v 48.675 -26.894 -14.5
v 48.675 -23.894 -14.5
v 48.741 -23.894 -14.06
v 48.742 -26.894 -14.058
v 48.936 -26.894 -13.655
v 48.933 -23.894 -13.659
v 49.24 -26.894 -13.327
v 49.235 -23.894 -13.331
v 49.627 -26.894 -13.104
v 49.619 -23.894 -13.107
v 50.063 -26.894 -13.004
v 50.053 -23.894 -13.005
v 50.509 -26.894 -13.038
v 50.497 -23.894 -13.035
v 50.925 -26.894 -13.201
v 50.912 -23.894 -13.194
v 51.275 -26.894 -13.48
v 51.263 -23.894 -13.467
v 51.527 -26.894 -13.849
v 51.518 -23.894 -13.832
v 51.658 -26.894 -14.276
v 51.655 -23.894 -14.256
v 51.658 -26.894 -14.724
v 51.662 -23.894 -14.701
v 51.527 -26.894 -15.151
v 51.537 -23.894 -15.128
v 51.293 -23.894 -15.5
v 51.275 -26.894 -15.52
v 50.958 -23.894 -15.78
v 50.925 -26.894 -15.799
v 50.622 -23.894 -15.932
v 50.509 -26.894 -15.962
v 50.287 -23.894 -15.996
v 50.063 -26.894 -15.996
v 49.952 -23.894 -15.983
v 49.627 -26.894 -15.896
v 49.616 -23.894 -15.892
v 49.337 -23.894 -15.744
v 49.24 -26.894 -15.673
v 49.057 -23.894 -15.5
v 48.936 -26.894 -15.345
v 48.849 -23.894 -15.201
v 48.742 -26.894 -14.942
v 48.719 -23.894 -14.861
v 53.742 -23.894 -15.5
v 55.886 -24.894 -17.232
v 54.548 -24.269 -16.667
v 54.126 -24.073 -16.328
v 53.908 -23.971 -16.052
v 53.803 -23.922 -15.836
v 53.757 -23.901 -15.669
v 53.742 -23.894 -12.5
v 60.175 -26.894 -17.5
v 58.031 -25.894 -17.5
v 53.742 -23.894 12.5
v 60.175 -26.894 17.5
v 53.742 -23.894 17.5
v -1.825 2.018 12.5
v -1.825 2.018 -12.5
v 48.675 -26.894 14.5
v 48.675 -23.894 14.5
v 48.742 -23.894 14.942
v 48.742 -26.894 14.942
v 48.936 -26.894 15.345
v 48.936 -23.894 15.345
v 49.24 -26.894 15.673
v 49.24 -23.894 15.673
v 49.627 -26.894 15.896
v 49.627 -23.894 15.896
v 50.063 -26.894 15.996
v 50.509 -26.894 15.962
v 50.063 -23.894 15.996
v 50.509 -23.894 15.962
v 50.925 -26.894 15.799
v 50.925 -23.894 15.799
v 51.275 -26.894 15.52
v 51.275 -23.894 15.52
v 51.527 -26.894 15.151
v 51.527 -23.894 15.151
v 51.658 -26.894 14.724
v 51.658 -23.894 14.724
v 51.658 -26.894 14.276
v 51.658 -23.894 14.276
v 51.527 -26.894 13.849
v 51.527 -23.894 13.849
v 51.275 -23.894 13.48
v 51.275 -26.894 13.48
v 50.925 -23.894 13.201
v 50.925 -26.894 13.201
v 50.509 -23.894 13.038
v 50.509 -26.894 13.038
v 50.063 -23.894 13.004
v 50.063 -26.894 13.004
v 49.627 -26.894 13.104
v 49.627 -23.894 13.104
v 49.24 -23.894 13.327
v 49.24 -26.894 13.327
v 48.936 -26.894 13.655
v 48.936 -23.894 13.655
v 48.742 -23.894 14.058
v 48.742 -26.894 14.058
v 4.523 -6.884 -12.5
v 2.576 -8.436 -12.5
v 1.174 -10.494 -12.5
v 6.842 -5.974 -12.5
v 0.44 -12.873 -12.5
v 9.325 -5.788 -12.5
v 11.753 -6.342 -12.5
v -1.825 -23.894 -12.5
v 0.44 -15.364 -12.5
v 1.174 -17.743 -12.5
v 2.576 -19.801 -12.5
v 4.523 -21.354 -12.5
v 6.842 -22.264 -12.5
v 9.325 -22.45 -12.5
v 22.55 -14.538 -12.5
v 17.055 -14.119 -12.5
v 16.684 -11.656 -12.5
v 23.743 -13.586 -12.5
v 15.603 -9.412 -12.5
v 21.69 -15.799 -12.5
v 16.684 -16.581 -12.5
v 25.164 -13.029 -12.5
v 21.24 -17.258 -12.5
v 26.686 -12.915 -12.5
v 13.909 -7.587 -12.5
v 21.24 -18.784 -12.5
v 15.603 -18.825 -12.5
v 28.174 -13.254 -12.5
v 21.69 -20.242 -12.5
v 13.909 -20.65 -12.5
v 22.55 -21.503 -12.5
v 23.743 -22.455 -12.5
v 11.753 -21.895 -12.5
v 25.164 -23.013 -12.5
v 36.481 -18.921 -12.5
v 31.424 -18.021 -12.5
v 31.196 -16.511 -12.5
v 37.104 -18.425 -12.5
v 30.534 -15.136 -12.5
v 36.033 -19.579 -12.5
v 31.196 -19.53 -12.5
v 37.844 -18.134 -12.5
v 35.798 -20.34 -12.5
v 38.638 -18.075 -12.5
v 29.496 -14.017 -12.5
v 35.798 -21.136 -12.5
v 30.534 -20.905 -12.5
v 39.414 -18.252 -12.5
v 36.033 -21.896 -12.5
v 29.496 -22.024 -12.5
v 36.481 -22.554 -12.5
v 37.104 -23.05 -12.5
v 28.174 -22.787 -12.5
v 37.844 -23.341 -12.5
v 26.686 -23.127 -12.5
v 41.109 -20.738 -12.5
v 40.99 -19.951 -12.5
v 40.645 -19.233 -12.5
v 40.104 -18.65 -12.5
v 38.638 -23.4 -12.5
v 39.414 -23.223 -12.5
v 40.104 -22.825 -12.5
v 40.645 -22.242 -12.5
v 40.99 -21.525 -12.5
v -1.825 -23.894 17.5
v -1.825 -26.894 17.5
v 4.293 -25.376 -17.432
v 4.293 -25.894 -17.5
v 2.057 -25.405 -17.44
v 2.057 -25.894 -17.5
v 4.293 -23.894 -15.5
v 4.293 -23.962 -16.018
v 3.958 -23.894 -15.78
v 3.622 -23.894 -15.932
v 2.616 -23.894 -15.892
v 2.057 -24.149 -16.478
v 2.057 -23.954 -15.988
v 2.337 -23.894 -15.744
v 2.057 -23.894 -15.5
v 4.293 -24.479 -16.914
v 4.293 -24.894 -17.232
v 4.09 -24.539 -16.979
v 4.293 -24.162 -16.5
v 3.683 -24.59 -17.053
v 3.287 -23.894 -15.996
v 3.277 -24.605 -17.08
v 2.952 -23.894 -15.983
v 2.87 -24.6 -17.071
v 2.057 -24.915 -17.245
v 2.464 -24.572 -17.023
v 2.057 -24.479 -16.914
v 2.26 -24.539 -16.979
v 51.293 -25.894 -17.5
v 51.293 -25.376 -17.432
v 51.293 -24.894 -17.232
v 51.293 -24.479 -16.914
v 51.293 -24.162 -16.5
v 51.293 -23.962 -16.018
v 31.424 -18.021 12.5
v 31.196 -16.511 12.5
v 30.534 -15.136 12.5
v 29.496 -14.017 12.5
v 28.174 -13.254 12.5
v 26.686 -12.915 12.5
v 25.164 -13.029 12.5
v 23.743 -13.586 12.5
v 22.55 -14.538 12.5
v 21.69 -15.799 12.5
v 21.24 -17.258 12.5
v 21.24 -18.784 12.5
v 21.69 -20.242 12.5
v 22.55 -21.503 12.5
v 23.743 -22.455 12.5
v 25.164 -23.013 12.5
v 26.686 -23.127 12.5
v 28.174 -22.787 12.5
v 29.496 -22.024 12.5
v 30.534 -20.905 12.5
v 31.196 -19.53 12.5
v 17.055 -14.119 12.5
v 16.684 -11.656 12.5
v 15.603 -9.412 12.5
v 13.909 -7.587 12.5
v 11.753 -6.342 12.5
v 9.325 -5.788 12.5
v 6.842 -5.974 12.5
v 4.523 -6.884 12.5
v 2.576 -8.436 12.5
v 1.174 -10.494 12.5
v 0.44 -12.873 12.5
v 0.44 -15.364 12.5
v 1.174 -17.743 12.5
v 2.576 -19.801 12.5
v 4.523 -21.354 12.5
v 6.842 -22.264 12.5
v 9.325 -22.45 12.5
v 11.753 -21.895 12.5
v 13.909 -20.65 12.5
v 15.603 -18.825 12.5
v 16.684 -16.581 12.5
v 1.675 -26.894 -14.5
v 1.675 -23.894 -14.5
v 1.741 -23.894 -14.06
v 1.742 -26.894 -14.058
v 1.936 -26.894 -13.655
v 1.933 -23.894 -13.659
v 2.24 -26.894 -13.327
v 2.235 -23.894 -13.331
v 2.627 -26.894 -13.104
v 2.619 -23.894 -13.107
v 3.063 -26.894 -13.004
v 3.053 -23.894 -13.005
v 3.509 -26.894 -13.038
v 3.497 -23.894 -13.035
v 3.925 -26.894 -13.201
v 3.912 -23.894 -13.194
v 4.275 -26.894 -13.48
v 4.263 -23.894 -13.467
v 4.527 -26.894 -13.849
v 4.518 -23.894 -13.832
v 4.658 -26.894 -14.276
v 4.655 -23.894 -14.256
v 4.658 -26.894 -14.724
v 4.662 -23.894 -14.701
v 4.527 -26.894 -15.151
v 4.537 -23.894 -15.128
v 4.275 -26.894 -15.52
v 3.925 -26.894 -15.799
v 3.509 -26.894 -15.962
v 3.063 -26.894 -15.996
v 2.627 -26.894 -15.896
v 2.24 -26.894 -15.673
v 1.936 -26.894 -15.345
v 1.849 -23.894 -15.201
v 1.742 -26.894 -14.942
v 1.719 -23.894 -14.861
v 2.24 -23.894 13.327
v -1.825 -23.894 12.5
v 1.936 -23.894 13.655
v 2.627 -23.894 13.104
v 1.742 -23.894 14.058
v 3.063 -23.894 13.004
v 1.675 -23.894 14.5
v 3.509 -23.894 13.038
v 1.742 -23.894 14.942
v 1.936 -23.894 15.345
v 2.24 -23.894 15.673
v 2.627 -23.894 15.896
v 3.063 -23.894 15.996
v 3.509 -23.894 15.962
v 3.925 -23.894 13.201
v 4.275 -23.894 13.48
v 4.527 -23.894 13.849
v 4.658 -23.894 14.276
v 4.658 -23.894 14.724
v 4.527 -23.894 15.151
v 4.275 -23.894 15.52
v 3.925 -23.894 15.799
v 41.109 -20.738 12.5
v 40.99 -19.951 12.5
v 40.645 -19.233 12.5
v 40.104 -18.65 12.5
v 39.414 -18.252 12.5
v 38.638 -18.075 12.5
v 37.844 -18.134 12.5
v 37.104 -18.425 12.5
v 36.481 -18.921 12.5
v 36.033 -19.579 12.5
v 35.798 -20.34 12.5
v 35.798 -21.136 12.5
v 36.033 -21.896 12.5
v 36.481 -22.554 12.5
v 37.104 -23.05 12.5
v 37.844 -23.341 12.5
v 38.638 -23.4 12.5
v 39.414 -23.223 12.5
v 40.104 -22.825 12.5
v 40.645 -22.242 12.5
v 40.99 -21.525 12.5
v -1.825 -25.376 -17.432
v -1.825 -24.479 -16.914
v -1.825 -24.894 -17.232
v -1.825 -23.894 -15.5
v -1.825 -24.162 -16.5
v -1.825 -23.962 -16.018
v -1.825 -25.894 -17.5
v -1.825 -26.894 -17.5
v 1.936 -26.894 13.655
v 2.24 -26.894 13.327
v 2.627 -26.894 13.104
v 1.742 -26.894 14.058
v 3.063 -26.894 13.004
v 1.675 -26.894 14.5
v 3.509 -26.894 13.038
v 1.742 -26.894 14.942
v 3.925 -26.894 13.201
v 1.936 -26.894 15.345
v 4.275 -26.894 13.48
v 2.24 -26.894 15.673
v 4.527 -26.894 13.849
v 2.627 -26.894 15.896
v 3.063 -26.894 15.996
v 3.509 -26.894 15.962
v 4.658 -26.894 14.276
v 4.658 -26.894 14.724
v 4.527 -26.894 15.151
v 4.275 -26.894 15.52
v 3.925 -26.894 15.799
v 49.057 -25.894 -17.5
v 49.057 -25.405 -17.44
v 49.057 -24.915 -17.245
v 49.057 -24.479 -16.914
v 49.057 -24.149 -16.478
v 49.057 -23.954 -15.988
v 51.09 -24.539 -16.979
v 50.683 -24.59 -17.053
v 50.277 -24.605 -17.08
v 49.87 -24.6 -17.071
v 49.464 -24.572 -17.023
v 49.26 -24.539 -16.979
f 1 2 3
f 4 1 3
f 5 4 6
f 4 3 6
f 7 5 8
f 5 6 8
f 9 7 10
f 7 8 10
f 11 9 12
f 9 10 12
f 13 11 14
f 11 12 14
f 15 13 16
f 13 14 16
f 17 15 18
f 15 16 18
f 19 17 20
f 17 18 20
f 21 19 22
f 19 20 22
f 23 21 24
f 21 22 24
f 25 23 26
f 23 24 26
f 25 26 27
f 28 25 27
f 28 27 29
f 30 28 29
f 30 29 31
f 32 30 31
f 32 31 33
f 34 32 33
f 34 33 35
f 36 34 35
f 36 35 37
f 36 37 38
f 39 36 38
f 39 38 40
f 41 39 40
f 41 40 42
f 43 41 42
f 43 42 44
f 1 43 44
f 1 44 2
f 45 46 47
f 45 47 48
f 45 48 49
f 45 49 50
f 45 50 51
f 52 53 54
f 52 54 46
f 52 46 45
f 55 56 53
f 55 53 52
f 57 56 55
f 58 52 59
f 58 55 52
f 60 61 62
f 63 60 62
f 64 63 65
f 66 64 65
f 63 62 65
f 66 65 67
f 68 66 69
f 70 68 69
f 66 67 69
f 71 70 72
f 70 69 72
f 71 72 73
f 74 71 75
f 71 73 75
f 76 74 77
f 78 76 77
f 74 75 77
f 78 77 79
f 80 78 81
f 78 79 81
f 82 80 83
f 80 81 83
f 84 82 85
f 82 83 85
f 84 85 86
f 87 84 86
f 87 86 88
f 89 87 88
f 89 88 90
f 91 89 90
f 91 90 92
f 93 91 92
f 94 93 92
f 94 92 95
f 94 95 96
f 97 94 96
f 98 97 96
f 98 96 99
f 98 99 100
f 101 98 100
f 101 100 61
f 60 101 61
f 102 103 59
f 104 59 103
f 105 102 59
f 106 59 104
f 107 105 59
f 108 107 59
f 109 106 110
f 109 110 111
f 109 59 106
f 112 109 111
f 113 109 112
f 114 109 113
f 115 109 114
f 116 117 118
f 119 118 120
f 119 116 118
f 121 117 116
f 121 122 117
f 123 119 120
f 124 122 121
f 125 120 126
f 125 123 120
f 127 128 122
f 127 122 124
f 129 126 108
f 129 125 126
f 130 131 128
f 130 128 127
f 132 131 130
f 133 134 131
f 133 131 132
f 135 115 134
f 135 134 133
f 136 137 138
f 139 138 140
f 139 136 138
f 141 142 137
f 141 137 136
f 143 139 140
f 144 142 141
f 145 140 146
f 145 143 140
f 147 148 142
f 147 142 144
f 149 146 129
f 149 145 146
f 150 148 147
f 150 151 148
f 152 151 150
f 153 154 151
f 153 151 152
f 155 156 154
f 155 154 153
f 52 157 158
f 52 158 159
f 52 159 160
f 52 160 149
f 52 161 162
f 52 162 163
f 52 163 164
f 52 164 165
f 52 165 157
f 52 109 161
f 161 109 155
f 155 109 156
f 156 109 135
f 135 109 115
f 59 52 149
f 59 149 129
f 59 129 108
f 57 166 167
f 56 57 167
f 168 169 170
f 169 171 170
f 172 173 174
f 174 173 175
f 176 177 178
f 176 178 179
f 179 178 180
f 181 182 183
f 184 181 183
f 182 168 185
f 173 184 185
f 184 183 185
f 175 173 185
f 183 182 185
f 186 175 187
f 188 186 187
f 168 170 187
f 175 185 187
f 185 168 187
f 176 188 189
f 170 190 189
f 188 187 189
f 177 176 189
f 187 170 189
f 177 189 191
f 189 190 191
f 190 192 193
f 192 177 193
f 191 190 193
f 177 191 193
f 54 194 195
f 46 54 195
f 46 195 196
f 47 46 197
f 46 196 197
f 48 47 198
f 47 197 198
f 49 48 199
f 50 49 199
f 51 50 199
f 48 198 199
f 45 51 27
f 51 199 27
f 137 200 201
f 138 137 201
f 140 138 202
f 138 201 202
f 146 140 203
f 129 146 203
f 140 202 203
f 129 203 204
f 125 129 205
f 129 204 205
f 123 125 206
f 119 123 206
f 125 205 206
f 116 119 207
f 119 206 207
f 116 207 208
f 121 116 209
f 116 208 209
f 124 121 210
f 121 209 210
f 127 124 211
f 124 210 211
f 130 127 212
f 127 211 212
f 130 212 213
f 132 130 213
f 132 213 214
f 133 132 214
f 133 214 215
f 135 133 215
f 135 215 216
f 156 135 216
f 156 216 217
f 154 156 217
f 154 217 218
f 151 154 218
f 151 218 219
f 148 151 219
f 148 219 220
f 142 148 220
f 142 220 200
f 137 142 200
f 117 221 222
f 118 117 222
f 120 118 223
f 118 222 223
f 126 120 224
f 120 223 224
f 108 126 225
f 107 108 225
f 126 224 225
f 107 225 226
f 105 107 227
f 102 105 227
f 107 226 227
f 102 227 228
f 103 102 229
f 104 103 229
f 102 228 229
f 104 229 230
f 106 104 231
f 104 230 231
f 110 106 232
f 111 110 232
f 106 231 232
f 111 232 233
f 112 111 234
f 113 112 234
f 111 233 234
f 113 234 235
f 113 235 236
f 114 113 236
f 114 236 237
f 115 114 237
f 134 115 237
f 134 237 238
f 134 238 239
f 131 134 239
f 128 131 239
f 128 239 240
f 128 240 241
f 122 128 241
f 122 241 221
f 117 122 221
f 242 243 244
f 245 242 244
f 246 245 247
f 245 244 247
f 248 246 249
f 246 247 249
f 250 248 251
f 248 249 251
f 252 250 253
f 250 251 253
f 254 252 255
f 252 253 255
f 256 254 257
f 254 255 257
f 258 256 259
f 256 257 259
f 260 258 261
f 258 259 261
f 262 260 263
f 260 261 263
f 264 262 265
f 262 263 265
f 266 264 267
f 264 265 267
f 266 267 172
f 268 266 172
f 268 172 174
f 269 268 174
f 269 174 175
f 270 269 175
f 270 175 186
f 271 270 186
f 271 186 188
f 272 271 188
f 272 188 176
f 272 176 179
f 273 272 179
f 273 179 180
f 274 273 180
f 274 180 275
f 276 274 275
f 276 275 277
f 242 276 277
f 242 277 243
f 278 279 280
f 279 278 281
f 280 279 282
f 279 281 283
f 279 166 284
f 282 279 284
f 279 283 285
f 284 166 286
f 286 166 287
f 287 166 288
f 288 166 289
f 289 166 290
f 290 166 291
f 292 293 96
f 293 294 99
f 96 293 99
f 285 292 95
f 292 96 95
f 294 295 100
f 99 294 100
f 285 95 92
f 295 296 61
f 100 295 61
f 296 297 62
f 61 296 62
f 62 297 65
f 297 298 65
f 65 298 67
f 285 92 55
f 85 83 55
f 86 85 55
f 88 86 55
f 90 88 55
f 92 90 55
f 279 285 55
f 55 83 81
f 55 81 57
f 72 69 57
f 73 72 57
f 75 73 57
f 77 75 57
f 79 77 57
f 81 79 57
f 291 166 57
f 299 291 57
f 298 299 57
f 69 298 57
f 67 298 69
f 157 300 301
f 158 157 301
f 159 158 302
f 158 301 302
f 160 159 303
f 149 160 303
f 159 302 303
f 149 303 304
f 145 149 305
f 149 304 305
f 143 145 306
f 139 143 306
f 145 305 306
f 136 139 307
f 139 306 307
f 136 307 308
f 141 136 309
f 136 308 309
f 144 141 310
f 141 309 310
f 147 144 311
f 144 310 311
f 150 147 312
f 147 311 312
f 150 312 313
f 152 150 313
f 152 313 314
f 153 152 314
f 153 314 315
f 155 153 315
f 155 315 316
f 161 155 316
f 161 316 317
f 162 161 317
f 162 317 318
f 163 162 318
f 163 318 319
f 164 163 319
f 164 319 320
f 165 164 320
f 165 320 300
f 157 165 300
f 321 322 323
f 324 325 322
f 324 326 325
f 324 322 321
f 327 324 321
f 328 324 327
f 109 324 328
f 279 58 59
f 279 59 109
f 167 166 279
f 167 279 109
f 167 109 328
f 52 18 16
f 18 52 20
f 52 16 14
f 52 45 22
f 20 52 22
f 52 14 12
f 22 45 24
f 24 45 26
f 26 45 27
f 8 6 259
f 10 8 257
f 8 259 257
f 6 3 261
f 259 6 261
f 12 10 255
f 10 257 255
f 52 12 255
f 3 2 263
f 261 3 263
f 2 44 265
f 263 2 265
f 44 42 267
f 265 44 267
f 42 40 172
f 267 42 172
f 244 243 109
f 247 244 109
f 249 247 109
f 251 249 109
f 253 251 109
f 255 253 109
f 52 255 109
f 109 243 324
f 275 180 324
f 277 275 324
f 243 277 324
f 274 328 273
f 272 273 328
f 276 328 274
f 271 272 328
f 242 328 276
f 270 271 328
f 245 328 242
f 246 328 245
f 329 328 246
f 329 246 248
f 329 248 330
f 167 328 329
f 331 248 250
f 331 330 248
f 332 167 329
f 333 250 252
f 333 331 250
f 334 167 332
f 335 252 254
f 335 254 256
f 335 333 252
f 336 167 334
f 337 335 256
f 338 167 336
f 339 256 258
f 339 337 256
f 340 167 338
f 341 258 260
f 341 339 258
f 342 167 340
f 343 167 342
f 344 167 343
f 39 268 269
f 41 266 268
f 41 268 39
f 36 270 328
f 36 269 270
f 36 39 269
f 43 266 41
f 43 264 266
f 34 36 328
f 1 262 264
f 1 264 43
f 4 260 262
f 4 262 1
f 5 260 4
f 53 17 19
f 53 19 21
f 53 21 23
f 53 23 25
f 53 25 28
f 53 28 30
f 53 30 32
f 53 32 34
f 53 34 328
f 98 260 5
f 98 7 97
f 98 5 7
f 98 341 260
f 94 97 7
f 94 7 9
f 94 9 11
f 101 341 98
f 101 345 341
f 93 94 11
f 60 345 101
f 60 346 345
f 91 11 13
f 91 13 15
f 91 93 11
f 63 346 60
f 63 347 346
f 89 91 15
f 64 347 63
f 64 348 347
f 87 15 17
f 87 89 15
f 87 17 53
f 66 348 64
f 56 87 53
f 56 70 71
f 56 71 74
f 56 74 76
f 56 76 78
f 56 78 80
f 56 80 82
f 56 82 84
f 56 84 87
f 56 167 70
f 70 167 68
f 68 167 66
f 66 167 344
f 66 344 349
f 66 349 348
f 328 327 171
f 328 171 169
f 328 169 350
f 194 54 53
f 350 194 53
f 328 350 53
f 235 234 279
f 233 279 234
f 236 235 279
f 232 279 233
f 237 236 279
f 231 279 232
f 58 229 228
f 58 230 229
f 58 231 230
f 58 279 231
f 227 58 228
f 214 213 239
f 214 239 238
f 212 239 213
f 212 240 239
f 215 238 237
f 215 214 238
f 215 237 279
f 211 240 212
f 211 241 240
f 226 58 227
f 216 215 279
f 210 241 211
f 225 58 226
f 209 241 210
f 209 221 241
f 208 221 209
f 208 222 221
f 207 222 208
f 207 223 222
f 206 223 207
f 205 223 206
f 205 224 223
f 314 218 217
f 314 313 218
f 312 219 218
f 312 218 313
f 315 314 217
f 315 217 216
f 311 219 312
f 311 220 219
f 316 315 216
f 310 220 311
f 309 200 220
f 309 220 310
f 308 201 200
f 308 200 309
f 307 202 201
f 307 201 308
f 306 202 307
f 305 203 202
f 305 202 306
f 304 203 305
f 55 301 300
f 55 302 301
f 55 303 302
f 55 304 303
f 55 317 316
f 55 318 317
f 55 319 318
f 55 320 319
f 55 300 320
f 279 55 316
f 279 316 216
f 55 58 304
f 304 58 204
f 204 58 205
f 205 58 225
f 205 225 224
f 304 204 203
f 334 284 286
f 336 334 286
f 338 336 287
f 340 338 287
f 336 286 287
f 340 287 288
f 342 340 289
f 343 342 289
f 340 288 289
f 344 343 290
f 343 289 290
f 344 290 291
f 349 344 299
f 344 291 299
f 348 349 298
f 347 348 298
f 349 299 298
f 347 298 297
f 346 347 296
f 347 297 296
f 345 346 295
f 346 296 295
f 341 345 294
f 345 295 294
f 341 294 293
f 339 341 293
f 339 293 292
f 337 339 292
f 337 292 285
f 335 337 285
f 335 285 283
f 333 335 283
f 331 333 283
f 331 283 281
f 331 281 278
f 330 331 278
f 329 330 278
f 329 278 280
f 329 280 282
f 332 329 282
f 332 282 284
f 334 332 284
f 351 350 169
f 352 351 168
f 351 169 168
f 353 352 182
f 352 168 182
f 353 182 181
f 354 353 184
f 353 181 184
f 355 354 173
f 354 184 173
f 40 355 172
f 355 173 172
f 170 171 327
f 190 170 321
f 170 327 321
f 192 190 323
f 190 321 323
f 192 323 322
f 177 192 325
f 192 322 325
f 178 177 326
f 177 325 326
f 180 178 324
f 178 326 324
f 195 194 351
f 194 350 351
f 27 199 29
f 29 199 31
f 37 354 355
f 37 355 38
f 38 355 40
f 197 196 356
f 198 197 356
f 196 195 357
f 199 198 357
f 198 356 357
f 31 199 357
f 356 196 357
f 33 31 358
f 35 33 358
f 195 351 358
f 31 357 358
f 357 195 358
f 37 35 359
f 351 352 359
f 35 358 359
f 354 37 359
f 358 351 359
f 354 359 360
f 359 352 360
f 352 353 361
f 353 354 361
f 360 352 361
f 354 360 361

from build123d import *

# Parameters (mm, degrees)
PAD_DEPTH       = 17.5
POCKET_DEPTH    = 5
POCKET001_DEPTH = 5
SKETCH003_R     = 1.5
POCKET002_DEPTH = 3.001
SKETCH005_R     = 8.354384
SKETCH005_R_2   = 5.120413
SKETCH005_R_3   = 2.670225
POCKET004_DEPTH = 30.001
FILLET_R        = 2


with BuildPart() as part:
    # Sketch → Pad (new body, symmetric)
    with BuildSketch(Plane.XY):
        Polygon((-1.824811, 2.017518), (-1.824811, -26.893557), (60.175189, -26.893557), align=None)
    extrude(amount=PAD_DEPTH, both=True)

    # Sketch001 → Pocket (cut)
    with BuildSketch(Plane.XY.offset(17.5)):
        Polygon((-1.824811, 2.017518), (-1.824811, -23.893557), (53.741669, -23.893557), align=None)
    extrude(amount=-POCKET_DEPTH, mode=Mode.SUBTRACT)

    # Sketch002 → Pocket001 (cut)
    with BuildSketch(Plane(origin=(0, 0, -17.5), x_dir=(1, 0, 0), z_dir=(0, 0, -1))):
        Polygon((53.741669, 23.893557), (-1.824811, 23.893557), (-1.824811, -2.017518), align=None)
    extrude(amount=-POCKET001_DEPTH, mode=Mode.SUBTRACT)

    # Sketch003 → Pocket002 (cut, through all)
    with BuildSketch(Plane(origin=(0, -23.893557, 0), x_dir=(-1, 0, 0), z_dir=(0, 1, 0))):
        with Locations((-50.175189, 14.5)):
            Circle(SKETCH003_R)
        with Locations((-3.175189, 14.5)):
            Circle(SKETCH003_R)
        with Locations((-50.175189, -14.5)):
            Circle(SKETCH003_R)
        with Locations((-3.175189, -14.5)):
            Circle(SKETCH003_R)
    extrude(amount=-POCKET002_DEPTH, mode=Mode.SUBTRACT)

    # Sketch005 → Pocket004 (cut, through all)
    with BuildSketch(Plane.XY.offset(12.5)):
        with Locations((8.700624, -14.118617)):
            Circle(SKETCH005_R)
        with Locations((26.303152, -18.020678)):
            Circle(SKETCH005_R_2)
        with Locations((38.438648, -20.737577)):
            Circle(SKETCH005_R_3)
    extrude(amount=-POCKET004_DEPTH, mode=Mode.SUBTRACT)

    # Fillet
    fillet_edges = [part.edges().sort_by_distance(p)[0] for p in [
        (25.958429, -23.893557, -17.5),
    ]]
    fillet(fillet_edges, radius=FILLET_R)


solid = part.part
